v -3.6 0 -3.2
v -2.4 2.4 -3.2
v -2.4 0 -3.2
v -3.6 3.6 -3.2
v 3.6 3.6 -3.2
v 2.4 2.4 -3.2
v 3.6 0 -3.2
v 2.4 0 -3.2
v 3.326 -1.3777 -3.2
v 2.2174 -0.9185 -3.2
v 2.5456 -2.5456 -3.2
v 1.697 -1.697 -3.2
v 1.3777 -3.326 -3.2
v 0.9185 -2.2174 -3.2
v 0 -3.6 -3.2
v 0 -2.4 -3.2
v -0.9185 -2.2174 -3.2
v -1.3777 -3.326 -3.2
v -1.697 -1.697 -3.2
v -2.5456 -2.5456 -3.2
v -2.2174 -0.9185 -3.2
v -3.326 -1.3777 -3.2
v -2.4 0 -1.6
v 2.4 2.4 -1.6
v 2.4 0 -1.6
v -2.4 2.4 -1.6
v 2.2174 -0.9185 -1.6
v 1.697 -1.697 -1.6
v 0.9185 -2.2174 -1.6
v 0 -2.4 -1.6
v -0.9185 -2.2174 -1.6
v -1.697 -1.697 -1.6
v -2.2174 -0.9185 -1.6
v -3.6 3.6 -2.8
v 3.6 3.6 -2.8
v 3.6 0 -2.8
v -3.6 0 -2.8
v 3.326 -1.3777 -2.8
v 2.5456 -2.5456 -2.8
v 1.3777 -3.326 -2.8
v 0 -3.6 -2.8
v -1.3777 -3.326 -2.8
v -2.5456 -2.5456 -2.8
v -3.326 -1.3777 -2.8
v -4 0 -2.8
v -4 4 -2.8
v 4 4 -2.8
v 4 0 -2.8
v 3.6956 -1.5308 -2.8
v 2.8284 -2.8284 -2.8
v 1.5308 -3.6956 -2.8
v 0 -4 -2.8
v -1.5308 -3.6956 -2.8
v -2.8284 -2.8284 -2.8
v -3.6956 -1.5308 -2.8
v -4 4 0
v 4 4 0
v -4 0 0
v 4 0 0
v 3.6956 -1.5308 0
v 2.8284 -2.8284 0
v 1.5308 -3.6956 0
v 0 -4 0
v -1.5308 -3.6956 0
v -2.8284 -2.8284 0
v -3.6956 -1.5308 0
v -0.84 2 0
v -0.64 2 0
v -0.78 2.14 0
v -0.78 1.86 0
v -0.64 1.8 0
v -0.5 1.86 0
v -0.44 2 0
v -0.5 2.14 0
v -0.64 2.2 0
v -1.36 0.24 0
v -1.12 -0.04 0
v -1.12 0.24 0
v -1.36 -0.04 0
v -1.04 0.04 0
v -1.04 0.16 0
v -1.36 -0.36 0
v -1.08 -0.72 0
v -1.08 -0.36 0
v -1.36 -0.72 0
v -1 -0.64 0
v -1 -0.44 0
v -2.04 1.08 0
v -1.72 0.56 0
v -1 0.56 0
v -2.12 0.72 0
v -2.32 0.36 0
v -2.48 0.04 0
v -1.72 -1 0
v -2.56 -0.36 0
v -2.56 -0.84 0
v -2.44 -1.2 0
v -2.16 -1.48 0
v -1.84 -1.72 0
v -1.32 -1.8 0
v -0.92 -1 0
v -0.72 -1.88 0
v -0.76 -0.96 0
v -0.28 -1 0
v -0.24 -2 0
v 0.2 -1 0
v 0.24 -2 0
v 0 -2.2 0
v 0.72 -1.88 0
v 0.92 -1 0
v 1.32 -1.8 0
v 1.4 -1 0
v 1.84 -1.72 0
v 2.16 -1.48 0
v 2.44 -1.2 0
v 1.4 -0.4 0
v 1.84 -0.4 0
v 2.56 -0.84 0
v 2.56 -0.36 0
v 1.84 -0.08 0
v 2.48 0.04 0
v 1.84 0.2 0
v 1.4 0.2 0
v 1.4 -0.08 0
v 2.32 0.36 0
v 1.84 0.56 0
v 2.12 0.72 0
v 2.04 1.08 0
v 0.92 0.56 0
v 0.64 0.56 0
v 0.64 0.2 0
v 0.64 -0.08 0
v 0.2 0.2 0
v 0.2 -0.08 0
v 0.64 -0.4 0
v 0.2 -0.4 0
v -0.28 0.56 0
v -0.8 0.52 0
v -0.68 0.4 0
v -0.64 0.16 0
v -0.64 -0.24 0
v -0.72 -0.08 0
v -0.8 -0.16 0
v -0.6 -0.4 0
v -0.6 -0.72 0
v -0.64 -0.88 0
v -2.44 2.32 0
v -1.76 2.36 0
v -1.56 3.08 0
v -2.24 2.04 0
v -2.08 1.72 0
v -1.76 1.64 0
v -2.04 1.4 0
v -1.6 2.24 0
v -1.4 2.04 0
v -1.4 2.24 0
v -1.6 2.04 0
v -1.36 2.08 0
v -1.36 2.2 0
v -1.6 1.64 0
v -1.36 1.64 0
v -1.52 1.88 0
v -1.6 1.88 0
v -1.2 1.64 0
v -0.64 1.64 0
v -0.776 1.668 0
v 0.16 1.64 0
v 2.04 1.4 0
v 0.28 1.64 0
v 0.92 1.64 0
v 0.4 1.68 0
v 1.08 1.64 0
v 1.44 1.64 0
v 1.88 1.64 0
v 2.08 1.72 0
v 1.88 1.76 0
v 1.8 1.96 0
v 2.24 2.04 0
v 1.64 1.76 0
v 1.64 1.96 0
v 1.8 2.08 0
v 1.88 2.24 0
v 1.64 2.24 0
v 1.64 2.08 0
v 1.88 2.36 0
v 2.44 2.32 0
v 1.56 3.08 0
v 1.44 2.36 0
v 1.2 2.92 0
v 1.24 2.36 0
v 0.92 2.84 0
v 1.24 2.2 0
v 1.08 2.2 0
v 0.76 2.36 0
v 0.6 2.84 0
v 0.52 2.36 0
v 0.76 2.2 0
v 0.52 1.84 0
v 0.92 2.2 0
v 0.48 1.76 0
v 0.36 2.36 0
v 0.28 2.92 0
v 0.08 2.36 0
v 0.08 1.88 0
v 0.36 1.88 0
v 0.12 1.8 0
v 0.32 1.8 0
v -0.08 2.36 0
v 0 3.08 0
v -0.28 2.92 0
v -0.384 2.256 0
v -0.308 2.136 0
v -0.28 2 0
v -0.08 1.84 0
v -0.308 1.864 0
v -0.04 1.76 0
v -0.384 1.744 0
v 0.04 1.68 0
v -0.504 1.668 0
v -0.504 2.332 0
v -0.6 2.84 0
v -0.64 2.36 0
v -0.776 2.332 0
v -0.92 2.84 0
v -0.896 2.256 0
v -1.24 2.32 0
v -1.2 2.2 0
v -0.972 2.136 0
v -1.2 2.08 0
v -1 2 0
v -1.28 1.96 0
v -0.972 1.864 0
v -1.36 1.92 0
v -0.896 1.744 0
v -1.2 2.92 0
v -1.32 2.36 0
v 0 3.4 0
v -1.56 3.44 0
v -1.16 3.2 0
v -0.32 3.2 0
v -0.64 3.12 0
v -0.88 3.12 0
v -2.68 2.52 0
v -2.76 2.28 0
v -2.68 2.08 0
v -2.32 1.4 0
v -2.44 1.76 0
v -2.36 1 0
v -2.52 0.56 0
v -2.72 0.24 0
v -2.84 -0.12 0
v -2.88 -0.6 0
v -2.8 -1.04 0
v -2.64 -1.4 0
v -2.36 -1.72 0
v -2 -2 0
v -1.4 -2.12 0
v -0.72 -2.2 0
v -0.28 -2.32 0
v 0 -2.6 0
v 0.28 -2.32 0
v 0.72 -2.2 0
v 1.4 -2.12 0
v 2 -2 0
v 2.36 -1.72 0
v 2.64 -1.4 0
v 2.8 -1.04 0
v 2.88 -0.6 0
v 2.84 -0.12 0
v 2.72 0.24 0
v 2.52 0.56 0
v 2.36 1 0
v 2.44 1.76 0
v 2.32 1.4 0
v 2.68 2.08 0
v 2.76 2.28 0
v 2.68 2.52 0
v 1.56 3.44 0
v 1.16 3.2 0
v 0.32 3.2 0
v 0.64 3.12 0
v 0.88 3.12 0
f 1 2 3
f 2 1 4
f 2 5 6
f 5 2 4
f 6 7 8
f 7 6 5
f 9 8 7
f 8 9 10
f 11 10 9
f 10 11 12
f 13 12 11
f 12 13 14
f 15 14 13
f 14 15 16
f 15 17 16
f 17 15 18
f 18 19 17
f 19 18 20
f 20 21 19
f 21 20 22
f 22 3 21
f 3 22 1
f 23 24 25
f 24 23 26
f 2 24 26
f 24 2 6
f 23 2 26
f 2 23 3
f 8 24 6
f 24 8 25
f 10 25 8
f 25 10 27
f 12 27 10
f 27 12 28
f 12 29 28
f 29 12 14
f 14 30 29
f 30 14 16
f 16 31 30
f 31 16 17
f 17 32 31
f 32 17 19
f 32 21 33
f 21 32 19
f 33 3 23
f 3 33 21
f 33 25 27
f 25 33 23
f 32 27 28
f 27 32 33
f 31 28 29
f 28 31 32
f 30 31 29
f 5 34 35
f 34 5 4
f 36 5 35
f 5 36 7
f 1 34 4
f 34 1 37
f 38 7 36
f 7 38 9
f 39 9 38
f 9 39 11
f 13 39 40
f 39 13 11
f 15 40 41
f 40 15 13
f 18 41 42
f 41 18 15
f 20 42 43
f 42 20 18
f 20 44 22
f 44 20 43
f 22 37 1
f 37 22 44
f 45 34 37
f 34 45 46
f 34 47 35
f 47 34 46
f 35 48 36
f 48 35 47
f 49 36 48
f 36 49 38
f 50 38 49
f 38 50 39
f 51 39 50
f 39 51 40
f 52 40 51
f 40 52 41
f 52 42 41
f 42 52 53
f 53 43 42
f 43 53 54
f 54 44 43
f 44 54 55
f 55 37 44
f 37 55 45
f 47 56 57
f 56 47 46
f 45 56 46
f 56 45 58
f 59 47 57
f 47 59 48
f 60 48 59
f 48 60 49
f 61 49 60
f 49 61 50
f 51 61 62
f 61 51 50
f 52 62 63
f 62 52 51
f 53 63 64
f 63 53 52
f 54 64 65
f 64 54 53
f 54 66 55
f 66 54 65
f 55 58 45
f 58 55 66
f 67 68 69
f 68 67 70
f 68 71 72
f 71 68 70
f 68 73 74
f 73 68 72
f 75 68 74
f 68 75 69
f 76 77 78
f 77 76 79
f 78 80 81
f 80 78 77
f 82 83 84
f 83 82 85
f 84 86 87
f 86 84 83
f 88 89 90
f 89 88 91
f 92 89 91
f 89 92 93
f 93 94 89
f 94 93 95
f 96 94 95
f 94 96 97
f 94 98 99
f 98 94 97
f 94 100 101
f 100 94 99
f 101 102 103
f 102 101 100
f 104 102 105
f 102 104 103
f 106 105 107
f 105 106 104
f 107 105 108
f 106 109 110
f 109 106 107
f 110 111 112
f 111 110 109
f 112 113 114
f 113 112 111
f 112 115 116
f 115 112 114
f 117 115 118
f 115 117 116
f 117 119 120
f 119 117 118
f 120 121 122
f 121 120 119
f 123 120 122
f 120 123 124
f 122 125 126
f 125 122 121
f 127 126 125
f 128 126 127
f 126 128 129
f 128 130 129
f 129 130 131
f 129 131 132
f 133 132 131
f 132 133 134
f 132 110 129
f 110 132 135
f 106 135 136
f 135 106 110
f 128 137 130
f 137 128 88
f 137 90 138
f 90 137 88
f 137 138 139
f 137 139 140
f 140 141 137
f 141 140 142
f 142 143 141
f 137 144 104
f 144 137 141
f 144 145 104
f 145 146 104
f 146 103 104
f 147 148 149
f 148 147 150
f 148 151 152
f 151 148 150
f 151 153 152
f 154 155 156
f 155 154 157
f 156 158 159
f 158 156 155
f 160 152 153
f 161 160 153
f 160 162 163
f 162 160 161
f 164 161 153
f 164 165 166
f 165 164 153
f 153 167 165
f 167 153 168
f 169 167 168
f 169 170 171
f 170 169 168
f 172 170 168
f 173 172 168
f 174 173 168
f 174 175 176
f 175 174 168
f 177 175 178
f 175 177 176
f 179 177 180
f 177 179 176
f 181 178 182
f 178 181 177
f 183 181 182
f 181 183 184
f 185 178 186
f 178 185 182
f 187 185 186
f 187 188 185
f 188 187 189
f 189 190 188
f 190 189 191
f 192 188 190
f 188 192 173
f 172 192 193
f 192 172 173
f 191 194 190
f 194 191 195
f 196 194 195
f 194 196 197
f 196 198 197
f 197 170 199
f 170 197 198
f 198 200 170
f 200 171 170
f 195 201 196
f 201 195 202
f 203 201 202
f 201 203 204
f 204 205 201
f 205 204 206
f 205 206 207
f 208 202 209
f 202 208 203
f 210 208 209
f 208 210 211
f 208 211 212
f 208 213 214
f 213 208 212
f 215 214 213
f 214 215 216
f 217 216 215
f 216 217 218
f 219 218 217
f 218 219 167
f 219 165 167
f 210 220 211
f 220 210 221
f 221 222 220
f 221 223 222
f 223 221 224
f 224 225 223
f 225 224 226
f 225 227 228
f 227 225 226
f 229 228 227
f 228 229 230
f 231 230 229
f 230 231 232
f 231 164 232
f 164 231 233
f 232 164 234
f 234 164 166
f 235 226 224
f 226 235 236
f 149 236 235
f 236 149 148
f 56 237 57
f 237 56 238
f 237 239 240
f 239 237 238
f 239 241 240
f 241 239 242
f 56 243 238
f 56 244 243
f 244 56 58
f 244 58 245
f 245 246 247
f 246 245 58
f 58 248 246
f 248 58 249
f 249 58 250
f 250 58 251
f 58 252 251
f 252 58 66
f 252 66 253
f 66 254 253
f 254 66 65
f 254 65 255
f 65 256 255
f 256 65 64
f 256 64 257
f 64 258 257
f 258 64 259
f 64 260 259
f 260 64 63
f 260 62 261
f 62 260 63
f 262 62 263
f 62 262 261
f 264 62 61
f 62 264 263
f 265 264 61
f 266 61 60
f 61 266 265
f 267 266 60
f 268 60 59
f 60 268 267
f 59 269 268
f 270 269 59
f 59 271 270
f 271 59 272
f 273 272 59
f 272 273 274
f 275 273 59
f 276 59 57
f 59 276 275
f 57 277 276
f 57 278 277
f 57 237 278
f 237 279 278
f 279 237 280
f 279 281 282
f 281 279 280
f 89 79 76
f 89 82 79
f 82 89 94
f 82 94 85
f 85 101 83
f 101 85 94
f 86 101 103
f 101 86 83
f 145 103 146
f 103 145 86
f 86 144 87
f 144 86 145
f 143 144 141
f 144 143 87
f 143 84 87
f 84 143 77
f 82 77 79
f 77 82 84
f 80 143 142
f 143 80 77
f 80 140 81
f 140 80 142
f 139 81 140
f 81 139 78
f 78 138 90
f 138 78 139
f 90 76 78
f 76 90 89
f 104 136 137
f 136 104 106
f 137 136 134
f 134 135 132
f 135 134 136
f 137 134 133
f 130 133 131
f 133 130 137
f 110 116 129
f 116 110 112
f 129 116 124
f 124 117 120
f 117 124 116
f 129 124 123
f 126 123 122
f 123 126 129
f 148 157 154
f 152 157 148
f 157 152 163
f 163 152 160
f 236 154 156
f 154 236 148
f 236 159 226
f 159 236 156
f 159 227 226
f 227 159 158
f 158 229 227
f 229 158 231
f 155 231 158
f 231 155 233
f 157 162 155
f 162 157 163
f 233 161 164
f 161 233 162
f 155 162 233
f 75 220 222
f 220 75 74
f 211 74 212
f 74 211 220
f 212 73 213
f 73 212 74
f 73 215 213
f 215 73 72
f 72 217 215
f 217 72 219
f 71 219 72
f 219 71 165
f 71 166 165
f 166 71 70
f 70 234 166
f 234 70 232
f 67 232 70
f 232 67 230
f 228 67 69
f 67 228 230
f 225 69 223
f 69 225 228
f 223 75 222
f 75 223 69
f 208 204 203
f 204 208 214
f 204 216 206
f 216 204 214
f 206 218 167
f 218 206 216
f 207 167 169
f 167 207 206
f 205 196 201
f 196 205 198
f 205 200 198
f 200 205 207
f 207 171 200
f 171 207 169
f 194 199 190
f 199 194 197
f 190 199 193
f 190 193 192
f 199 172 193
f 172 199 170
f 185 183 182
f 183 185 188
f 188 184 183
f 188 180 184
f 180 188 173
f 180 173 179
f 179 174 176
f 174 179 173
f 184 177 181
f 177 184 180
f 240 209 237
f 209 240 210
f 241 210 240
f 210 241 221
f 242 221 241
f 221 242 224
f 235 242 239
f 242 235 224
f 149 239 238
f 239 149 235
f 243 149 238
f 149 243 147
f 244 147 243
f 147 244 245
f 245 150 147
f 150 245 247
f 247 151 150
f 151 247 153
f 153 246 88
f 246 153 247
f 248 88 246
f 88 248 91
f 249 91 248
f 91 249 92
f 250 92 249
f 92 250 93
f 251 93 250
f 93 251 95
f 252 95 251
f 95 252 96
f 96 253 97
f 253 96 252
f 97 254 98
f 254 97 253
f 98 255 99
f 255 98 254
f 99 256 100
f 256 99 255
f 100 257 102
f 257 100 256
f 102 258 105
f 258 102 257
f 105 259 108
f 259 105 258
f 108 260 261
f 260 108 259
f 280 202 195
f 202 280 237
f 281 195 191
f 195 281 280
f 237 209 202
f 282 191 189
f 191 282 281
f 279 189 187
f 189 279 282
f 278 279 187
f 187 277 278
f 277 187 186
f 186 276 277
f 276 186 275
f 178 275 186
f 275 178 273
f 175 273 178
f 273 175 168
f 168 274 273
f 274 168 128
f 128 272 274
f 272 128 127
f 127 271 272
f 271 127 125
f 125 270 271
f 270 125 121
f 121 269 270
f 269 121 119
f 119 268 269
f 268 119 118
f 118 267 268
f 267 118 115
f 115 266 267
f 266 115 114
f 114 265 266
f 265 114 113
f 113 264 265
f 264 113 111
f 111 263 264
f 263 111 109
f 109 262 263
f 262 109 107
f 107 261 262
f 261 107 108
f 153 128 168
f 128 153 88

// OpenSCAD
use <../lib.scad>
use <s/24246pt0s01.scad>
use <s/24246pt0s02.scad>
use <s/24246s02.scad>
function ldraw_lib__24246pt1() = [
// 0 Tile  1 x  1 with Rounded End with White Highway Sign, Blue Outline and "ROUTE BFF" Pattern
// 0 Name: 24246pt1.dat
// 0 Author: Takeshi Takahashi [RainbowDolphin]
// 0 !LDRAW_ORG Part UPDATE 2023-05
// 0 !LICENSE Licensed under CC BY 4.0 : see CAreadme.txt
// 
// 0 BFC CERTIFY CCW
  [0,"BFC","CERTIFY"],
  [0,"BFC","CCW"],
// 
// 0 !KEYWORDS adventure, Bricklink 24246pb013, Dots, Rebrickable 24246pr0009
// 0 !KEYWORDS Set 41918
// 
// 0 !HISTORY 2023-10-31 [OrionP] Official Update 2023-05
// 
// 
// 1 16 0 0 0 1 0 0 0 1 0 0 0 1 s\24246s02.dat
  [1,16,0,0,0,1,0,0,0,1,0,0,0,1, ldraw_lib__s__24246s02()],
// 1 16 0 0 0 1 0 0 0 1 0 0 0 1 s\24246pt0s01.dat
  [1,16,0,0,0,1,0,0,0,1,0,0,0,1, ldraw_lib__s__24246pt0s01()],
// 1 1 0 0 0 1 0 0 0 1 0 0 0 1 s\24246pt0s02.dat
  [1,1,0,0,0,1,0,0,0,1,0,0,0,1, ldraw_lib__s__24246pt0s02()],
];
module ldraw_lib__24246pt1(step=0, col=false, unit=2/5, alt=false, line=0.2, solid=!$preview)
    makepoly(ldraw_lib__24246pt1(), step=step, col=col, unit=unit, alt=alt, line=line, solid=solid);
ldraw_lib__24246pt1(line=0.2);
